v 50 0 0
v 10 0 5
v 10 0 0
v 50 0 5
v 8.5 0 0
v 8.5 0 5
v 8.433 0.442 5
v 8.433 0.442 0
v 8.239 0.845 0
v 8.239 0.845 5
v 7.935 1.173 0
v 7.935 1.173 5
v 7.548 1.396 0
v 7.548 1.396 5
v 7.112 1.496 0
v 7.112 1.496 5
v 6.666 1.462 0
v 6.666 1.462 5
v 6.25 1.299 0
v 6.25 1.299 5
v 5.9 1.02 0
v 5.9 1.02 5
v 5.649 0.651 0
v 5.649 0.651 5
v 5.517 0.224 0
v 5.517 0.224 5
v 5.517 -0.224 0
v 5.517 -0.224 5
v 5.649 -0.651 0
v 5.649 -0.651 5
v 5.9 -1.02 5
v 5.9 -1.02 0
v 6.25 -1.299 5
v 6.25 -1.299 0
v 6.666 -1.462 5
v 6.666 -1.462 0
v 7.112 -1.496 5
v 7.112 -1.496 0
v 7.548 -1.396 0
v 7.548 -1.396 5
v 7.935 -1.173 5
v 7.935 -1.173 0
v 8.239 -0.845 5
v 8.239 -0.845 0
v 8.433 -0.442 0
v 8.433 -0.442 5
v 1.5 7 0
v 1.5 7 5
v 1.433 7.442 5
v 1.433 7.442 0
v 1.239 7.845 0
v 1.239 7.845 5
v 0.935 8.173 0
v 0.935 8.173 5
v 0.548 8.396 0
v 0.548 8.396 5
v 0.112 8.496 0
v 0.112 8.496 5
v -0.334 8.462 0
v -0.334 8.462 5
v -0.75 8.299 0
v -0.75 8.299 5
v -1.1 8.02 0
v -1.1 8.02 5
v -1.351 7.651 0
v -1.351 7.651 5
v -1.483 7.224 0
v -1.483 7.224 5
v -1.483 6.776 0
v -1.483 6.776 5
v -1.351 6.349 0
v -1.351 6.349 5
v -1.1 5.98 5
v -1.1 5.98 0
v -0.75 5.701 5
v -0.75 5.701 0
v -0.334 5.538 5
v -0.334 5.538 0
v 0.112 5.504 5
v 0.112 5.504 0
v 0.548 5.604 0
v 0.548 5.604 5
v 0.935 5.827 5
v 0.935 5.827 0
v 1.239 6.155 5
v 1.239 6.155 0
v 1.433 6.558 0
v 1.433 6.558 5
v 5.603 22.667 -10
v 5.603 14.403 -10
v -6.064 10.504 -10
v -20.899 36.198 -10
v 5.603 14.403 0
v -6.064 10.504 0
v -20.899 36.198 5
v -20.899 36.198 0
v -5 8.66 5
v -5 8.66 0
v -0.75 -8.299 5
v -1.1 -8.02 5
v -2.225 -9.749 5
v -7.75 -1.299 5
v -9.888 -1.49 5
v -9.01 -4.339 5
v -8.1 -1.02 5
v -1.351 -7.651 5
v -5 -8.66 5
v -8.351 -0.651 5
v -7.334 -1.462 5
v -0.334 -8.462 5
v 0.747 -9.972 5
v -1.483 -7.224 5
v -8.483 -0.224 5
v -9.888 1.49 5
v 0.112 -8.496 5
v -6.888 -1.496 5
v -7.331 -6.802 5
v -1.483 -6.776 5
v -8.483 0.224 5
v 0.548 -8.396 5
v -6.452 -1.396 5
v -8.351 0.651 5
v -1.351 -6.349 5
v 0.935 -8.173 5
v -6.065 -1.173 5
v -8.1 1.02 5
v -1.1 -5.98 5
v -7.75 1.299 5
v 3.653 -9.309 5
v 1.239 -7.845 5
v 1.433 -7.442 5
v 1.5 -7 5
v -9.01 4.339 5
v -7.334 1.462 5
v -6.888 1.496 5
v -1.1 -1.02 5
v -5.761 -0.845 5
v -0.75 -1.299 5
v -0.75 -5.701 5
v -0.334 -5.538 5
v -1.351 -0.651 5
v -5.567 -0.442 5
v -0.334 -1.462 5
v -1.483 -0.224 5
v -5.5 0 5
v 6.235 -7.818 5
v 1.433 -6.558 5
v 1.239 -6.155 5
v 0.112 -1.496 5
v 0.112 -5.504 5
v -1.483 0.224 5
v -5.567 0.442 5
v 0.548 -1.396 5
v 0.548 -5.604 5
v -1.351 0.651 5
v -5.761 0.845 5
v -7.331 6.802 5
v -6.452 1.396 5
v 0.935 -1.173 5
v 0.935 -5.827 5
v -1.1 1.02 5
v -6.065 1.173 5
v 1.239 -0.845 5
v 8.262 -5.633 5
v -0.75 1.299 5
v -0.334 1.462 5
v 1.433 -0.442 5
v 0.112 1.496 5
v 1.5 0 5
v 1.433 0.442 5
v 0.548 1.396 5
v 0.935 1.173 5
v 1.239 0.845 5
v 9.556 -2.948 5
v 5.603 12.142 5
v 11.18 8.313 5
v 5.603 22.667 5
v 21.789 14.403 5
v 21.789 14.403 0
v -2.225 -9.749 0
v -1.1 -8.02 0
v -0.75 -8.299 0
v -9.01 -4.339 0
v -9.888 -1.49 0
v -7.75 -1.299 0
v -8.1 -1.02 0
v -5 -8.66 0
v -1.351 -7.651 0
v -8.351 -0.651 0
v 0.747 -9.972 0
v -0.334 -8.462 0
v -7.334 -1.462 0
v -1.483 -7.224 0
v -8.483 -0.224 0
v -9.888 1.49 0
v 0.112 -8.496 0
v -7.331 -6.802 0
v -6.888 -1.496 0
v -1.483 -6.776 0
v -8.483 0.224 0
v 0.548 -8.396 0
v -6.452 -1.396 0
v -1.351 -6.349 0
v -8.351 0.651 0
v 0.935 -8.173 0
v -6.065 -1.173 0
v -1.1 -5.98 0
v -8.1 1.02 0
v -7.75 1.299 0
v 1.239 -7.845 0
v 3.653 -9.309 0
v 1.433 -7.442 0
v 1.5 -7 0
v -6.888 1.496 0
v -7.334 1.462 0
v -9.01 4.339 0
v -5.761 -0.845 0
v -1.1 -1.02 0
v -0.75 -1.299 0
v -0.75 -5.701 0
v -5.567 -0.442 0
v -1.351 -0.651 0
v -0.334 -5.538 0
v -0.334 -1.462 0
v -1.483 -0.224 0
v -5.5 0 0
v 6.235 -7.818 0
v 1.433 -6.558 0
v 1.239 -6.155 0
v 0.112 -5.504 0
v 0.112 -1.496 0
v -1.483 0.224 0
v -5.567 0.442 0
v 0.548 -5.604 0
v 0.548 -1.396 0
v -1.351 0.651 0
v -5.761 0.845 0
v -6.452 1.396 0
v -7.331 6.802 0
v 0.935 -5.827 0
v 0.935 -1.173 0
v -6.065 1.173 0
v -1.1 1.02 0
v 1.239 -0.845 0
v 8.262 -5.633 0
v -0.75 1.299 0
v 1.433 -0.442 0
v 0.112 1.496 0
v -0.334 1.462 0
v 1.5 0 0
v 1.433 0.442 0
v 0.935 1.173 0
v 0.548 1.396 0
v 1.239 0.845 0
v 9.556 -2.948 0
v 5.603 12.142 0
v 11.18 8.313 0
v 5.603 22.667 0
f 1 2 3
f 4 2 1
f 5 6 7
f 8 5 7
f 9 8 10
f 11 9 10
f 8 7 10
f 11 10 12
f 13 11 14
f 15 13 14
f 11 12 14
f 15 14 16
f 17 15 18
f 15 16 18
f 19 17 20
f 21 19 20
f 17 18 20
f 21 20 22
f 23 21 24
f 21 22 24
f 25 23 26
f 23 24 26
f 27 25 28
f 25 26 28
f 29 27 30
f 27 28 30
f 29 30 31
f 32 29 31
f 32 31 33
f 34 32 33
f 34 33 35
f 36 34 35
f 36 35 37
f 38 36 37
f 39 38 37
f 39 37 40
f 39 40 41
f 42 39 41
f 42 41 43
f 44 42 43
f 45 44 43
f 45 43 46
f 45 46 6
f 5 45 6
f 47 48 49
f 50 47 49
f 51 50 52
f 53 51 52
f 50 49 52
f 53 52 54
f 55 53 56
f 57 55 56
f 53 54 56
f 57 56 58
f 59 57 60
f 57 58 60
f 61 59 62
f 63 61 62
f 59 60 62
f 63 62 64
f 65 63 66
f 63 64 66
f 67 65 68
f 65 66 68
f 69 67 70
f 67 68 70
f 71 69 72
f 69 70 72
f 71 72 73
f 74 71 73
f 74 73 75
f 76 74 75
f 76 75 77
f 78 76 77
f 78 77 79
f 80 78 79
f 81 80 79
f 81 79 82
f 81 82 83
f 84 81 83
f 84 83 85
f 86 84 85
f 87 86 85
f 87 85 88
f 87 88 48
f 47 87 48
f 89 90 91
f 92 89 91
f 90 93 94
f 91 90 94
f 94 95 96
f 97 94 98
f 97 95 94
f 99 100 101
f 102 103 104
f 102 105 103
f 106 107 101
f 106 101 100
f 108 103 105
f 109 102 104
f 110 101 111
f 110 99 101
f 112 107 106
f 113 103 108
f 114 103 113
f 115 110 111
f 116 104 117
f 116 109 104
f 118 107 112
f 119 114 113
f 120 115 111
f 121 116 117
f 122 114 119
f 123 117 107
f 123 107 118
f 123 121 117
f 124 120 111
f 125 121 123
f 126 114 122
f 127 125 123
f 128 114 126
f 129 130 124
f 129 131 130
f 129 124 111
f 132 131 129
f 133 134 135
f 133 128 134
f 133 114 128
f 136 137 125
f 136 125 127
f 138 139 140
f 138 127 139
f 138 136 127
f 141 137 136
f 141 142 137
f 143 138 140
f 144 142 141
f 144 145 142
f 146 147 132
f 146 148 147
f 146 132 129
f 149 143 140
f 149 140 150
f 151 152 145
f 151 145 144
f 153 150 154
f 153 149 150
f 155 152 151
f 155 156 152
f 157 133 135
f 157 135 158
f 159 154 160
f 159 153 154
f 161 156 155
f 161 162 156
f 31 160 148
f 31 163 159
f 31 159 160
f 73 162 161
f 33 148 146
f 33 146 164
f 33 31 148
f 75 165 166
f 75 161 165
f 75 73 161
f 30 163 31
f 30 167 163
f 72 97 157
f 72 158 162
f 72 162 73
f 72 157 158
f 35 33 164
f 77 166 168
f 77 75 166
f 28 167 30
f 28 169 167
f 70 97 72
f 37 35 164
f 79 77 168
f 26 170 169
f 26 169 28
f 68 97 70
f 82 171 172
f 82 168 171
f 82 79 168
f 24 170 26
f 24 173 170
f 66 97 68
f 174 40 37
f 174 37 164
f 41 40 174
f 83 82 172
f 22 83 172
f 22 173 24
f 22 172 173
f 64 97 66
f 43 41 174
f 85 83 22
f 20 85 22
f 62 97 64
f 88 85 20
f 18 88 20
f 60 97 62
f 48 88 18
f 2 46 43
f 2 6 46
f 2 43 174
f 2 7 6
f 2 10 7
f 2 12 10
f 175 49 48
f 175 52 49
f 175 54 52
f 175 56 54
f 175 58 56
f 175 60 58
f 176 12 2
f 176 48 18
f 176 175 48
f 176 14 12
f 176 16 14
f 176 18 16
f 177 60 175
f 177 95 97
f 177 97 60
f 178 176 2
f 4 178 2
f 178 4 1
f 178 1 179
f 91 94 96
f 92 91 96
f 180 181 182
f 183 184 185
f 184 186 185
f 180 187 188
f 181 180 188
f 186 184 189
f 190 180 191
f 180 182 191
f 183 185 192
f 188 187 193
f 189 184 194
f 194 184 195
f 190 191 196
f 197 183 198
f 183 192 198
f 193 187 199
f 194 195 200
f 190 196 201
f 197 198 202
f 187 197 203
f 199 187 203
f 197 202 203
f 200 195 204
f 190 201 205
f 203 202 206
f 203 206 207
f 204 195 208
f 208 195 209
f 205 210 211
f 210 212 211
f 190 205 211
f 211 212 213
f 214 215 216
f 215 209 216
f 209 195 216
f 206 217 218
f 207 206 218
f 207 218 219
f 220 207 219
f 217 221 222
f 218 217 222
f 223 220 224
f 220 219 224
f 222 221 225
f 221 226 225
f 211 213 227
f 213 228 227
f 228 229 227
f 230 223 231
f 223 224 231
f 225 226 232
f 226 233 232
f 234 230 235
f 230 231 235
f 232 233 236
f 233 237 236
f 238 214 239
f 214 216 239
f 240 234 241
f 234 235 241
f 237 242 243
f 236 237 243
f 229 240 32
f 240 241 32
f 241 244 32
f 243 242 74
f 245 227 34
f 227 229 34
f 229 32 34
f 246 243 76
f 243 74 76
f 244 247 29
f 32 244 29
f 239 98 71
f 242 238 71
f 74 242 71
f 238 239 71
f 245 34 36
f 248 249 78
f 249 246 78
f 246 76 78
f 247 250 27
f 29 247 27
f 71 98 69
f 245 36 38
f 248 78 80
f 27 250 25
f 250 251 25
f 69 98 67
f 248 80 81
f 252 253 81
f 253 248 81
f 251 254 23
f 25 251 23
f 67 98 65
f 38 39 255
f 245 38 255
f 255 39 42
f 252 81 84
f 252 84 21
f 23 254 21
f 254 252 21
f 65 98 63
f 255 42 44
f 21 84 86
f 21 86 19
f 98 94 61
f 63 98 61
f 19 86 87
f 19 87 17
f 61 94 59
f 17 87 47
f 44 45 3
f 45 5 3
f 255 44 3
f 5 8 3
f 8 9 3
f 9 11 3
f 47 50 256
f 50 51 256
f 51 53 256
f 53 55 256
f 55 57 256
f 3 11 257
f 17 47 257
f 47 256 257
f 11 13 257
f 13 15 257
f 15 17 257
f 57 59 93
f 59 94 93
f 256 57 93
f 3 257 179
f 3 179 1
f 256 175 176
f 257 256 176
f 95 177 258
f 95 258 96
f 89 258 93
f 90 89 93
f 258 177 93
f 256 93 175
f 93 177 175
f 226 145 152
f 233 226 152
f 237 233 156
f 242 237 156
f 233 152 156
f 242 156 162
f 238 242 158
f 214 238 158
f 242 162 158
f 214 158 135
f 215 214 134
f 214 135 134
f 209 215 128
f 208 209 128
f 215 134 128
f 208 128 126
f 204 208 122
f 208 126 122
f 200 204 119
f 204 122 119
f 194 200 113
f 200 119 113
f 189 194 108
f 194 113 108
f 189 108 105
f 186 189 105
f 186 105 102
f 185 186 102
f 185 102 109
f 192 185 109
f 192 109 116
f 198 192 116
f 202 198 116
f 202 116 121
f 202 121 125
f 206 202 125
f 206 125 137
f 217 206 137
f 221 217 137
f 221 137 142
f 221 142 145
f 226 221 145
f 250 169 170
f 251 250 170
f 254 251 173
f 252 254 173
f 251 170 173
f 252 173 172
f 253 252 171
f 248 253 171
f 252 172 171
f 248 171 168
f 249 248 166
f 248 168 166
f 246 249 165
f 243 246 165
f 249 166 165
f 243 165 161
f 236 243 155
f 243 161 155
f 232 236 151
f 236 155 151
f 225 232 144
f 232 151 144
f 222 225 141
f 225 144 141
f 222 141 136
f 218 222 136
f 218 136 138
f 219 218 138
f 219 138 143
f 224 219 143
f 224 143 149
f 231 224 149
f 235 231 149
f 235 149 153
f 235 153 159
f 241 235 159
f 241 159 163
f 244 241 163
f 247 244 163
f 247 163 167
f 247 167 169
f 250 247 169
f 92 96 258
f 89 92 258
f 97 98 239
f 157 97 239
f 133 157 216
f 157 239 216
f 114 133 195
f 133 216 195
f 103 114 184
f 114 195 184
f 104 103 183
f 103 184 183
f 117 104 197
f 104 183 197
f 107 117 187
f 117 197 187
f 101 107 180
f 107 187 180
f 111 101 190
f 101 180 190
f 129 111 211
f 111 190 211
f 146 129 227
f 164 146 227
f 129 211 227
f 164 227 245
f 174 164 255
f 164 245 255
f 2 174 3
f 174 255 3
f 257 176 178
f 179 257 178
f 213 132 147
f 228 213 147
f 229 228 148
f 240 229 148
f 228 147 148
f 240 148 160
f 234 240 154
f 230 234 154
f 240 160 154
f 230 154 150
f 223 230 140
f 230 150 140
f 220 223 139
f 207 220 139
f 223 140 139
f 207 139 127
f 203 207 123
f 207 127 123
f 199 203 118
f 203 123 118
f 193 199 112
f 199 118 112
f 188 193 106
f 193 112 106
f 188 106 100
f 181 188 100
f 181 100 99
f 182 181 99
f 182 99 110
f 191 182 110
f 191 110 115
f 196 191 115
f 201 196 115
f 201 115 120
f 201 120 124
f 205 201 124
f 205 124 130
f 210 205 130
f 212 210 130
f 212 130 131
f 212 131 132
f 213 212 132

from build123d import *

# Parameters (mm, degrees)
SKETCH_1_R          = 10
EXTRUDE_1_DEPTH     = 5
EXTRUDE_2_DEPTH     = 5
CUT_EXTRUDE_1_DEPTH = 5
EXTRUDE_3_DEPTH     = 10
SKETCH_5_R          = 1.5
CUT_EXTRUDE_2_DEPTH = 10
SKETCH_6_R          = 1.5
CUT_EXTRUDE_3_DEPTH = 10


with BuildPart() as part:
    # 草图1 → 凸台-拉伸1 (new body)
    with BuildSketch(Plane.XY):
        Circle(SKETCH_1_R)
    extrude(amount=EXTRUDE_1_DEPTH)

    # 草图2 → 凸台-拉伸2 (add)
    with BuildSketch(Plane.XY.offset(5)):
        Polygon((10, 0), (50, 0), (-20.898751954, 36.197700198), (0, 0), align=None)
    extrude(amount=-EXTRUDE_2_DEPTH)

    # 草图3 → 切除-拉伸1 (cut)
    with BuildSketch(Plane.XY.offset(5)):
        Polygon((5.603154877, 25.292377819), (5.603154877, 12.141678981), (11.179717043, 8.31299451), (24.663344965, 16.053595724), align=None)
    extrude(amount=-CUT_EXTRUDE_1_DEPTH, mode=Mode.SUBTRACT)

    # 草图4 → 凸台-拉伸3 (add)
    with BuildSketch(Plane(origin=(0, 0, 0), x_dir=(-1, 0, 0), z_dir=(0, 0, -1))):
        Polygon((-5.603154877, 22.667023681), (-5.603154877, 14.403378326), (6.064261942, 10.503609794), (20.898751954, 36.197700198), align=None)
    extrude(amount=EXTRUDE_3_DEPTH)

    # 草图5 → 切除-拉伸2 (cut)
    with BuildSketch(Plane.XY.offset(5)):
        with Locations((0, 7)):
            Circle(SKETCH_5_R)
        with Locations((7, 0)):
            Circle(SKETCH_5_R)
        with Locations((0, -7)):
            Circle(SKETCH_5_R)
        with Locations((-7, 0)):
            Circle(SKETCH_5_R)
    extrude(amount=-CUT_EXTRUDE_2_DEPTH, mode=Mode.SUBTRACT)

    # 草图6 → 切除-拉伸3 (cut)
    with BuildSketch(Plane.XY.offset(5)):
        Circle(SKETCH_6_R)
    extrude(amount=-CUT_EXTRUDE_3_DEPTH, mode=Mode.SUBTRACT)


solid = part.part
